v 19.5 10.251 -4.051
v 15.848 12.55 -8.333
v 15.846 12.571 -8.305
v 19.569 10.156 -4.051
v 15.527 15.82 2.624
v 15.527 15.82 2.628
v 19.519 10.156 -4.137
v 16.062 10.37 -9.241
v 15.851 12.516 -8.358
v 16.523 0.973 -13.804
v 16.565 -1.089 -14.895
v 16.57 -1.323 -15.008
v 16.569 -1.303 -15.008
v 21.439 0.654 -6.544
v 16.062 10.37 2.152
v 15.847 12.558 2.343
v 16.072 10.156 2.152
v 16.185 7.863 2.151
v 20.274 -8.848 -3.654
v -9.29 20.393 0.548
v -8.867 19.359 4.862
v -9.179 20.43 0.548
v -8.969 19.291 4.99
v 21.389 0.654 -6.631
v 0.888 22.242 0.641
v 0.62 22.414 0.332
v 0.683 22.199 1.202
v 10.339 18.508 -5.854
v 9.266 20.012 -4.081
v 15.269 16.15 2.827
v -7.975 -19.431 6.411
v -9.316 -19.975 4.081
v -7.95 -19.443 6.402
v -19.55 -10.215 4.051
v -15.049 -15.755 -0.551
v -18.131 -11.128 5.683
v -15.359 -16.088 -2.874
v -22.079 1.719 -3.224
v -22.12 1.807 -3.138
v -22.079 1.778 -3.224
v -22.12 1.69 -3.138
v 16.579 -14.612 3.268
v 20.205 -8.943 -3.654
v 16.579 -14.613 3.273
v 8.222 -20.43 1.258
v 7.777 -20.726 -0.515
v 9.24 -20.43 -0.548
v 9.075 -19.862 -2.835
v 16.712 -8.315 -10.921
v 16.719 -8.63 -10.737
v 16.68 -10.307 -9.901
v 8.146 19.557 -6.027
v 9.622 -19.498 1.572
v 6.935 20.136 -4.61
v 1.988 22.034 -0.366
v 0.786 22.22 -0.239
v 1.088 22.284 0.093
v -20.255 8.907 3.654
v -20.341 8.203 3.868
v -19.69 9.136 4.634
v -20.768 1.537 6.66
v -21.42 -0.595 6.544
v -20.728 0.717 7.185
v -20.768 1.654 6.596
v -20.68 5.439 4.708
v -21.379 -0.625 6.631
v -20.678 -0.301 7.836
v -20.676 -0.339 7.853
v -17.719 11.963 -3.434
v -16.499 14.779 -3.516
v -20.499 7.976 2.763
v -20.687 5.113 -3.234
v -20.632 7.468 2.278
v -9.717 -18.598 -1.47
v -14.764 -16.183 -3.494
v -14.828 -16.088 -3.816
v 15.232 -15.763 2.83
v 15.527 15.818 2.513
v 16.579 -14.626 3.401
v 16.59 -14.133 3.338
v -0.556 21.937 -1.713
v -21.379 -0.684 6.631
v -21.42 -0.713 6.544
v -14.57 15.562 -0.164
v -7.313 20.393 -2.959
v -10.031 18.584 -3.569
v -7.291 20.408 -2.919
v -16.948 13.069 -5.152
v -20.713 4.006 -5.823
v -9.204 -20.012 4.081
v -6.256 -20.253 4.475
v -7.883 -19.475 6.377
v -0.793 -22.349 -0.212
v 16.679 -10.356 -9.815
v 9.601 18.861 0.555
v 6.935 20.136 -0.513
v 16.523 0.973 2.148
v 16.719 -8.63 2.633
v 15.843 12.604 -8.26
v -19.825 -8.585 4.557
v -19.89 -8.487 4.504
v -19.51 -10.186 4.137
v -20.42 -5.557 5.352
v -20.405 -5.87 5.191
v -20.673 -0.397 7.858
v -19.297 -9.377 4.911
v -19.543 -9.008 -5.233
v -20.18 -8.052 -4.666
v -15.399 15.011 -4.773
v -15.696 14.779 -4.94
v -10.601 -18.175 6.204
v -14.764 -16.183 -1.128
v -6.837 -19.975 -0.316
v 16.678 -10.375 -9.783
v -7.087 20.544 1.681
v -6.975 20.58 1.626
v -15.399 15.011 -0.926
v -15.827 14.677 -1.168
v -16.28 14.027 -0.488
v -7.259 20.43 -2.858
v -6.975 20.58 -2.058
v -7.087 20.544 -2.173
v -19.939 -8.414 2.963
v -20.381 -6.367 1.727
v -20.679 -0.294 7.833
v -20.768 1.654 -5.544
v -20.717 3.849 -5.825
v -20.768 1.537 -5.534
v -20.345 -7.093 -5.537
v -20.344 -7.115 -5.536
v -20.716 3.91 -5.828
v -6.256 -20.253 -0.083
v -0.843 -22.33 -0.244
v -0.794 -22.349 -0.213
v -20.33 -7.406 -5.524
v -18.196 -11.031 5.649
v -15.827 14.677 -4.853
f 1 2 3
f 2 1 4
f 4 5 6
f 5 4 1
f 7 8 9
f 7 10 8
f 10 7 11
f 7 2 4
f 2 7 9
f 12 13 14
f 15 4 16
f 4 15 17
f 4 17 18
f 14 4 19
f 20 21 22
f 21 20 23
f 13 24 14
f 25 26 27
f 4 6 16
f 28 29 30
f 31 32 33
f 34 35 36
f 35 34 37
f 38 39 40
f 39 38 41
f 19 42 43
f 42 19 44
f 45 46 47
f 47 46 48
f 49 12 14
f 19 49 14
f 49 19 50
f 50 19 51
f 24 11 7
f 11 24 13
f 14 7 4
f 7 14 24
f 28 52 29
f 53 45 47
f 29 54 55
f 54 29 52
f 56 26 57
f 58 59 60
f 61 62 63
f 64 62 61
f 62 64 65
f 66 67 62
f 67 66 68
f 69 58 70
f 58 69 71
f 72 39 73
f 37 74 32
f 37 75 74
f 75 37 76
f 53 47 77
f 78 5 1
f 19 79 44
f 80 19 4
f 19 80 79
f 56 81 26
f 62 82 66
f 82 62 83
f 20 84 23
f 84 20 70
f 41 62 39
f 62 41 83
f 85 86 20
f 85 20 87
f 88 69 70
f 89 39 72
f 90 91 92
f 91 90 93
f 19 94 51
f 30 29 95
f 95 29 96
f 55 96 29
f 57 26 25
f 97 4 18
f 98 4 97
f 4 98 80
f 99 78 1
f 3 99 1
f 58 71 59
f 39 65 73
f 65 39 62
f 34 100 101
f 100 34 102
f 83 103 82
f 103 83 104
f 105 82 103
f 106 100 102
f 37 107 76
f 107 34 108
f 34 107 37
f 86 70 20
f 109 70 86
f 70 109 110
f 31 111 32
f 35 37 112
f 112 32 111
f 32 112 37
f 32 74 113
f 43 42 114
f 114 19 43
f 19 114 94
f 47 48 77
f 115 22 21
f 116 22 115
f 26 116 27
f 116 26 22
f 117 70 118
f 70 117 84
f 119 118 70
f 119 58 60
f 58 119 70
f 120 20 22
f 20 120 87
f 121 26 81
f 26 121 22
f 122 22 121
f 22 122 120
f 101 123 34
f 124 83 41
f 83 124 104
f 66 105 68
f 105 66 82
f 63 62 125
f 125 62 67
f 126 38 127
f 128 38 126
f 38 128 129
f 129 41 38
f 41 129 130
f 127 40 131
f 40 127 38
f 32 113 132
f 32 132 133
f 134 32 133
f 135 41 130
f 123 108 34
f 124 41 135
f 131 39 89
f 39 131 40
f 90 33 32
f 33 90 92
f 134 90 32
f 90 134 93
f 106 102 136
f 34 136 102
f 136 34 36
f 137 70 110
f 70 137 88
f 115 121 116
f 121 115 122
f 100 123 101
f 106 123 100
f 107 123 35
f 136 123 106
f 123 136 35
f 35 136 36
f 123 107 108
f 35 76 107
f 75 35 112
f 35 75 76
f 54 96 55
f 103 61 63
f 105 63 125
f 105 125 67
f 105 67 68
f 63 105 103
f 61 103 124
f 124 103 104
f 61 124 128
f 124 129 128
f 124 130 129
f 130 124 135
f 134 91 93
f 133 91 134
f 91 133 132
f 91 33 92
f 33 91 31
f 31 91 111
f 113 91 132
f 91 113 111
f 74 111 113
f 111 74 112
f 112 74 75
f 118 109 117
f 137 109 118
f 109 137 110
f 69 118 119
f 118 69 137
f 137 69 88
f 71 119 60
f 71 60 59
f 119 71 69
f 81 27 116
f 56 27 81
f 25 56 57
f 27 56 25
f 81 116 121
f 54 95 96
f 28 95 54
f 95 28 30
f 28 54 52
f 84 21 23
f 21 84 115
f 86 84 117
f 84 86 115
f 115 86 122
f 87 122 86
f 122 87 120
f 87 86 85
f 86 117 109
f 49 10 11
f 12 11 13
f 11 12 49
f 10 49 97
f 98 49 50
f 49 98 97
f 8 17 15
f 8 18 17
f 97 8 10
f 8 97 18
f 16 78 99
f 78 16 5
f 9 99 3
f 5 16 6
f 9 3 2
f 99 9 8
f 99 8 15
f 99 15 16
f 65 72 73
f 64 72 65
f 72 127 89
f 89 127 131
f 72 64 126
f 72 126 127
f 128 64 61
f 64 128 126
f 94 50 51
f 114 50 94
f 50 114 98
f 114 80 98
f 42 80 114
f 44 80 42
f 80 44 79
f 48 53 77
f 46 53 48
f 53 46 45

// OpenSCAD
// Auto-generated OpenSCAD file

    inner_points = 10*[[1.6046801444042071, -1.510518771363498, -0.51780774687208], [-0.7434345422794115, 2.015149679052852, -0.5348754332596579], [0.7734765787975868, -2.063842760532919, -0.4636487630145585], [-1.5746381078860319, 1.4618256898834308, -0.4807164494021364], [1.647527110349813, -1.4771486205669213, 0.4807164494021364], [-0.7005875763338056, 2.0485198298494285, 0.4636487630145585], [0.8163235447431927, -2.0304726097363424, 0.5348754332596579], [-1.531791141940426, 1.4951958406800074, 0.51780774687208], [0.6384522963590755, -0.21782729456619615, -2.1399731111236644], [0.08413761133612133, 0.6144701258584091, -2.1440022453297805], [-0.1927512692475448, -0.7711512837356173, -2.085814127266143], [-0.7470659542704989, 0.06114613668898816, -2.089843261472259], [0.8199549567342801, -0.0764690673724786, 2.089843261472259], [0.26564027171132587, 0.7558283530521267, 2.085814127266143], [-0.011248608872340221, -0.6297930565418997, 2.1440022453297805], [-0.5655632938952944, 0.2025043638827057, 2.1399731111236644], [1.4983810792725356, 1.5637611853237816, -0.6159872338465537], [-1.4683390427543601, -1.6124542668038486, -0.3825369624276627], [-2.0226537277773144, -0.7801568463792433, -0.38656609663377894], [1.5412280452181413, 1.597131336120358, 0.3825369624276627], [-1.4254920768087544, -1.5790841160072722, 0.6159872338465537], [-1.9798067618317083, -0.7467866955826666, 0.6119580996404375], [0.12173940895788779, 2.2222892177989073, -0.07818380251905571], [-0.048850406494106685, -2.237612148482398, 0.07818380251905571], [-2.054379777370347, 0.7736682073626848, 0.0636062580160924], [0.6845409546055283, -1.1575201029478461, -1.8010730352062194], [-0.7666737312477581, 1.0214628324726316, -1.8116214455030666], [0.8395627337115392, -1.0367857631561221, 1.8116214455030666], [-0.6116519521417472, 1.1421971722643556, 1.8010730352062194], [1.4840184706191157, 0.9496289399635032, -1.4050596644138698], [-1.5233042813157396, -1.0523160596421408, -1.2091106200212], [1.5961932837795207, 1.0369931289586503, 1.2091106200212], [-1.4111294681553346, -0.9649518706469937, 1.4050596644138698], [1.549714905842828, -0.9503805642017904, -1.3443814044656173], [-0.2440850958178369, 1.7429904657899544, -1.357419956647079], [0.2047992851212129, -1.845677585468592, -1.2567503277879908], [-1.5890007165394517, 0.8476934445231528, -1.2697888799694526], [1.661889719003233, -0.8630163752066433, 1.2697888799694526], [-0.1319102826574318, 1.8303546547851015, 1.2567503277879908], [0.31697409828161804, -1.758313396473445, 1.357419956647079], [-1.4768259033790467, 0.9350576335182998, 1.3443814044656173], [1.5036262475963749, -0.010687755820140424, -1.683281480383062], [0.6067262467660426, 1.335997759175732, -1.689800756473793], [-0.6724929387318603, -1.4593087662563635, -1.541491419847914], [-1.5693929395621924, -0.11262325126049072, -1.5480106959386448], [1.6422819420259736, 0.09730032057700028, 1.5480106959386448], [0.7453819411956415, 1.443985835572873, 1.541491419847914], [-0.5338372443022614, -1.3513206898592225, 1.689800756473793], [-1.4307372451325937, -0.004635174863350026, 1.683281480383062], [0.6210888554194628, 1.9501300045360104, -0.9007283259064769], [-0.617527700170481, -2.0194469734180718, -0.7149177622543765], [-2.0687423860237675, 0.15953596200240622, -0.7254661725512236], [0.6904167026342621, 2.0041240427345812, 0.7149177622543765], [-0.5481998529556816, -1.965452935219501, 0.9007283259064769], [-1.999414538808968, 0.21353000020097673, 0.8901799156096298]];

    outer_points = 10*[[1.6418145044797559, -1.472026782007085, 0.35163939402966377], [-0.4298446701047658, 2.033447834240434, -0.8163280238391935], [0.9209550497834971, -2.033447834240434, -0.05476932719099553], [-1.1507041248010244, 1.472026782007085, -1.2227367450598527], [1.1507041248010244, -1.472026782007085, 1.2227367450598527], [-0.9209550497834971, 2.033447834240434, 0.05476932719099553], [0.4298446701047658, -2.033447834240434, 0.8163280238391935], [-1.6418145044797559, 1.472026782007085, -0.35163939402966377], [1.6451443994420738, -0.13305462530052709, -1.5039495833206327], [1.156092008029022, 0.6944756775338761, -1.7796692894425854], [0.924284944745815, -0.6944756775338761, -1.910358304541292], [0.43523255333276334, 0.13305462530052709, -2.1860780106632447], [-0.43523255333276334, -0.13305462530052709, 2.1860780106632447], [-0.924284944745815, 0.6944756775338761, 1.910358304541292], [-1.156092008029022, -0.6944756775338761, 1.7796692894425854], [-1.6451443994420738, 0.13305462530052709, 1.5039495833206327], [1.5278338202912307, 1.602874022047165, 0.287378956293666], [-1.0367234406124997, -1.602874022047165, -1.158476307323855], [-1.525775832025551, -0.7753437192127617, -1.4341960134458078], [1.0367234406124997, 1.602874022047165, 1.158476307323855], [-1.5278338202912307, -1.602874022047165, -0.287378956293666], [-2.0168862117042825, -0.7753437192127617, -0.5630986624156187], [0.05891318954734109, 2.231926079561001, 0.03321428868135433], [-0.05891318954734109, -2.231926079561001, -0.03321428868135433], [-1.8283213639591795, 0.7621066828143632, -1.0307775567987123], [1.5286049144521512, -1.0832512297704806, -1.2149081307709086], [0.24824913145336436, 1.0832512297704806, -1.9367516927663138], [-0.24824913145336436, -1.0832512297704806, 1.9367516927663138], [-1.5286049144521512, 1.0832512297704806, 1.2149081307709086], [1.9469188372147817, 1.0156202244899935, -0.4050809529031537], [-0.6611751709879975, -1.0156202244899935, -1.8754815196038797], [0.6611751709879975, 1.0156202244899935, 1.8754815196038797], [-1.9469188372147817, -1.0156202244899935, 0.4050809529031537], [2.017362774104258, -0.8847729844499134, -0.36536581825036085], [0.434755990932788, 1.793171328963202, -1.2576135299972653], [0.8509876752939962, -1.793171328963202, -1.022948942509768], [-0.7316191078774735, 0.8847729844499134, -1.9151966542566723], [0.7316191078774735, -0.8847729844499134, 1.9151966542566723], [-0.8509876752939962, 1.793171328963202, 1.022948942509768], [-0.434755990932788, -1.793171328963202, 1.2576135299972653], [-2.017362774104258, 0.8847729844499134, 0.36536581825036085], [2.1339022590941807, 0.0654236200200401, -0.6544072708000847], [1.3425988675084457, 1.4043957767265978, -1.100531126673537], [0.24666770558766005, -1.4043957767265978, -1.7183991162801513], [-0.5446356859980751, -0.0654236200200401, -2.1645229721536037], [0.5446356859980751, 0.0654236200200401, 2.1645229721536037], [-0.24666770558766005, 1.4043957767265978, 1.7183991162801513], [-1.3425988675084457, -1.4043957767265978, 1.100531126673537], [-2.1339022590941807, -0.0654236200200401, 0.6544072708000847], [0.9235138505848948, 1.9916495742837694, -0.4080712174767174], [-0.12888056403684184, -1.9916495742837694, -1.0013939040001267], [-1.4092363470356286, 0.17485288525719178, -1.7232374659955318], [0.12888056403684184, 1.9916495742837694, 1.0013939040001267], [-0.9235138505848948, -1.9916495742837694, 0.4080712174767174], [-2.2038696335836816, 0.17485288525719178, -0.31377234451868774]];

    // Convex hull for inner set (I)
    module inner_hull() {
        hull() {
            for (p = inner_points) {
                translate(p) sphere(r=0.1);
            }
        }
    }

    // Convex hull for outer set (O) minus inner hull (O \ I)
    module outer_minus_inner() {
        difference() {
            hull() {
                for (p = outer_points) {
                    translate(p) sphere(r=0.1);
                }
            }
            inner_hull(); // Subtract inner hull
        }
    }

    // Convex hull for outer set (O) minus all translated inner hulls
    module outer_minus_AllTranslationInner() {
        difference() {
            hull() {
                for (p = outer_points) {
                    translate(p) sphere(r=0.1);
                }
            }
            hull() {
                translate([0,0,50]) inner_hull();
                translate([0,0,-50]) inner_hull();
            }; // Subtract translated inner hulls
        }
    }

    // Difference between outer_minus_inner and outer_minus_AllTranslationInner
    module outer_minus_inner_diff() {
        difference() {
            // Outer minus inner
            difference() {
                hull() {
                    for (p = outer_points) {
                        translate(p) sphere(r=0.1);
                    }
                }
                inner_hull();
            }

            // Subtract Outer minus AllTranslationInner
            difference() {
                hull() {
                    for (p = outer_points) {
                        translate(p) sphere(r=0.1);
                    }
                }
                hull() {
                    translate([0,0,50]) inner_hull();
                    translate([0,0,-50]) inner_hull();
                };
            }
        }
    }

    // Rendering all with colors applied
    color([0, 1, 0, 1]) outer_minus_AllTranslationInner(); // Opaque green
    
